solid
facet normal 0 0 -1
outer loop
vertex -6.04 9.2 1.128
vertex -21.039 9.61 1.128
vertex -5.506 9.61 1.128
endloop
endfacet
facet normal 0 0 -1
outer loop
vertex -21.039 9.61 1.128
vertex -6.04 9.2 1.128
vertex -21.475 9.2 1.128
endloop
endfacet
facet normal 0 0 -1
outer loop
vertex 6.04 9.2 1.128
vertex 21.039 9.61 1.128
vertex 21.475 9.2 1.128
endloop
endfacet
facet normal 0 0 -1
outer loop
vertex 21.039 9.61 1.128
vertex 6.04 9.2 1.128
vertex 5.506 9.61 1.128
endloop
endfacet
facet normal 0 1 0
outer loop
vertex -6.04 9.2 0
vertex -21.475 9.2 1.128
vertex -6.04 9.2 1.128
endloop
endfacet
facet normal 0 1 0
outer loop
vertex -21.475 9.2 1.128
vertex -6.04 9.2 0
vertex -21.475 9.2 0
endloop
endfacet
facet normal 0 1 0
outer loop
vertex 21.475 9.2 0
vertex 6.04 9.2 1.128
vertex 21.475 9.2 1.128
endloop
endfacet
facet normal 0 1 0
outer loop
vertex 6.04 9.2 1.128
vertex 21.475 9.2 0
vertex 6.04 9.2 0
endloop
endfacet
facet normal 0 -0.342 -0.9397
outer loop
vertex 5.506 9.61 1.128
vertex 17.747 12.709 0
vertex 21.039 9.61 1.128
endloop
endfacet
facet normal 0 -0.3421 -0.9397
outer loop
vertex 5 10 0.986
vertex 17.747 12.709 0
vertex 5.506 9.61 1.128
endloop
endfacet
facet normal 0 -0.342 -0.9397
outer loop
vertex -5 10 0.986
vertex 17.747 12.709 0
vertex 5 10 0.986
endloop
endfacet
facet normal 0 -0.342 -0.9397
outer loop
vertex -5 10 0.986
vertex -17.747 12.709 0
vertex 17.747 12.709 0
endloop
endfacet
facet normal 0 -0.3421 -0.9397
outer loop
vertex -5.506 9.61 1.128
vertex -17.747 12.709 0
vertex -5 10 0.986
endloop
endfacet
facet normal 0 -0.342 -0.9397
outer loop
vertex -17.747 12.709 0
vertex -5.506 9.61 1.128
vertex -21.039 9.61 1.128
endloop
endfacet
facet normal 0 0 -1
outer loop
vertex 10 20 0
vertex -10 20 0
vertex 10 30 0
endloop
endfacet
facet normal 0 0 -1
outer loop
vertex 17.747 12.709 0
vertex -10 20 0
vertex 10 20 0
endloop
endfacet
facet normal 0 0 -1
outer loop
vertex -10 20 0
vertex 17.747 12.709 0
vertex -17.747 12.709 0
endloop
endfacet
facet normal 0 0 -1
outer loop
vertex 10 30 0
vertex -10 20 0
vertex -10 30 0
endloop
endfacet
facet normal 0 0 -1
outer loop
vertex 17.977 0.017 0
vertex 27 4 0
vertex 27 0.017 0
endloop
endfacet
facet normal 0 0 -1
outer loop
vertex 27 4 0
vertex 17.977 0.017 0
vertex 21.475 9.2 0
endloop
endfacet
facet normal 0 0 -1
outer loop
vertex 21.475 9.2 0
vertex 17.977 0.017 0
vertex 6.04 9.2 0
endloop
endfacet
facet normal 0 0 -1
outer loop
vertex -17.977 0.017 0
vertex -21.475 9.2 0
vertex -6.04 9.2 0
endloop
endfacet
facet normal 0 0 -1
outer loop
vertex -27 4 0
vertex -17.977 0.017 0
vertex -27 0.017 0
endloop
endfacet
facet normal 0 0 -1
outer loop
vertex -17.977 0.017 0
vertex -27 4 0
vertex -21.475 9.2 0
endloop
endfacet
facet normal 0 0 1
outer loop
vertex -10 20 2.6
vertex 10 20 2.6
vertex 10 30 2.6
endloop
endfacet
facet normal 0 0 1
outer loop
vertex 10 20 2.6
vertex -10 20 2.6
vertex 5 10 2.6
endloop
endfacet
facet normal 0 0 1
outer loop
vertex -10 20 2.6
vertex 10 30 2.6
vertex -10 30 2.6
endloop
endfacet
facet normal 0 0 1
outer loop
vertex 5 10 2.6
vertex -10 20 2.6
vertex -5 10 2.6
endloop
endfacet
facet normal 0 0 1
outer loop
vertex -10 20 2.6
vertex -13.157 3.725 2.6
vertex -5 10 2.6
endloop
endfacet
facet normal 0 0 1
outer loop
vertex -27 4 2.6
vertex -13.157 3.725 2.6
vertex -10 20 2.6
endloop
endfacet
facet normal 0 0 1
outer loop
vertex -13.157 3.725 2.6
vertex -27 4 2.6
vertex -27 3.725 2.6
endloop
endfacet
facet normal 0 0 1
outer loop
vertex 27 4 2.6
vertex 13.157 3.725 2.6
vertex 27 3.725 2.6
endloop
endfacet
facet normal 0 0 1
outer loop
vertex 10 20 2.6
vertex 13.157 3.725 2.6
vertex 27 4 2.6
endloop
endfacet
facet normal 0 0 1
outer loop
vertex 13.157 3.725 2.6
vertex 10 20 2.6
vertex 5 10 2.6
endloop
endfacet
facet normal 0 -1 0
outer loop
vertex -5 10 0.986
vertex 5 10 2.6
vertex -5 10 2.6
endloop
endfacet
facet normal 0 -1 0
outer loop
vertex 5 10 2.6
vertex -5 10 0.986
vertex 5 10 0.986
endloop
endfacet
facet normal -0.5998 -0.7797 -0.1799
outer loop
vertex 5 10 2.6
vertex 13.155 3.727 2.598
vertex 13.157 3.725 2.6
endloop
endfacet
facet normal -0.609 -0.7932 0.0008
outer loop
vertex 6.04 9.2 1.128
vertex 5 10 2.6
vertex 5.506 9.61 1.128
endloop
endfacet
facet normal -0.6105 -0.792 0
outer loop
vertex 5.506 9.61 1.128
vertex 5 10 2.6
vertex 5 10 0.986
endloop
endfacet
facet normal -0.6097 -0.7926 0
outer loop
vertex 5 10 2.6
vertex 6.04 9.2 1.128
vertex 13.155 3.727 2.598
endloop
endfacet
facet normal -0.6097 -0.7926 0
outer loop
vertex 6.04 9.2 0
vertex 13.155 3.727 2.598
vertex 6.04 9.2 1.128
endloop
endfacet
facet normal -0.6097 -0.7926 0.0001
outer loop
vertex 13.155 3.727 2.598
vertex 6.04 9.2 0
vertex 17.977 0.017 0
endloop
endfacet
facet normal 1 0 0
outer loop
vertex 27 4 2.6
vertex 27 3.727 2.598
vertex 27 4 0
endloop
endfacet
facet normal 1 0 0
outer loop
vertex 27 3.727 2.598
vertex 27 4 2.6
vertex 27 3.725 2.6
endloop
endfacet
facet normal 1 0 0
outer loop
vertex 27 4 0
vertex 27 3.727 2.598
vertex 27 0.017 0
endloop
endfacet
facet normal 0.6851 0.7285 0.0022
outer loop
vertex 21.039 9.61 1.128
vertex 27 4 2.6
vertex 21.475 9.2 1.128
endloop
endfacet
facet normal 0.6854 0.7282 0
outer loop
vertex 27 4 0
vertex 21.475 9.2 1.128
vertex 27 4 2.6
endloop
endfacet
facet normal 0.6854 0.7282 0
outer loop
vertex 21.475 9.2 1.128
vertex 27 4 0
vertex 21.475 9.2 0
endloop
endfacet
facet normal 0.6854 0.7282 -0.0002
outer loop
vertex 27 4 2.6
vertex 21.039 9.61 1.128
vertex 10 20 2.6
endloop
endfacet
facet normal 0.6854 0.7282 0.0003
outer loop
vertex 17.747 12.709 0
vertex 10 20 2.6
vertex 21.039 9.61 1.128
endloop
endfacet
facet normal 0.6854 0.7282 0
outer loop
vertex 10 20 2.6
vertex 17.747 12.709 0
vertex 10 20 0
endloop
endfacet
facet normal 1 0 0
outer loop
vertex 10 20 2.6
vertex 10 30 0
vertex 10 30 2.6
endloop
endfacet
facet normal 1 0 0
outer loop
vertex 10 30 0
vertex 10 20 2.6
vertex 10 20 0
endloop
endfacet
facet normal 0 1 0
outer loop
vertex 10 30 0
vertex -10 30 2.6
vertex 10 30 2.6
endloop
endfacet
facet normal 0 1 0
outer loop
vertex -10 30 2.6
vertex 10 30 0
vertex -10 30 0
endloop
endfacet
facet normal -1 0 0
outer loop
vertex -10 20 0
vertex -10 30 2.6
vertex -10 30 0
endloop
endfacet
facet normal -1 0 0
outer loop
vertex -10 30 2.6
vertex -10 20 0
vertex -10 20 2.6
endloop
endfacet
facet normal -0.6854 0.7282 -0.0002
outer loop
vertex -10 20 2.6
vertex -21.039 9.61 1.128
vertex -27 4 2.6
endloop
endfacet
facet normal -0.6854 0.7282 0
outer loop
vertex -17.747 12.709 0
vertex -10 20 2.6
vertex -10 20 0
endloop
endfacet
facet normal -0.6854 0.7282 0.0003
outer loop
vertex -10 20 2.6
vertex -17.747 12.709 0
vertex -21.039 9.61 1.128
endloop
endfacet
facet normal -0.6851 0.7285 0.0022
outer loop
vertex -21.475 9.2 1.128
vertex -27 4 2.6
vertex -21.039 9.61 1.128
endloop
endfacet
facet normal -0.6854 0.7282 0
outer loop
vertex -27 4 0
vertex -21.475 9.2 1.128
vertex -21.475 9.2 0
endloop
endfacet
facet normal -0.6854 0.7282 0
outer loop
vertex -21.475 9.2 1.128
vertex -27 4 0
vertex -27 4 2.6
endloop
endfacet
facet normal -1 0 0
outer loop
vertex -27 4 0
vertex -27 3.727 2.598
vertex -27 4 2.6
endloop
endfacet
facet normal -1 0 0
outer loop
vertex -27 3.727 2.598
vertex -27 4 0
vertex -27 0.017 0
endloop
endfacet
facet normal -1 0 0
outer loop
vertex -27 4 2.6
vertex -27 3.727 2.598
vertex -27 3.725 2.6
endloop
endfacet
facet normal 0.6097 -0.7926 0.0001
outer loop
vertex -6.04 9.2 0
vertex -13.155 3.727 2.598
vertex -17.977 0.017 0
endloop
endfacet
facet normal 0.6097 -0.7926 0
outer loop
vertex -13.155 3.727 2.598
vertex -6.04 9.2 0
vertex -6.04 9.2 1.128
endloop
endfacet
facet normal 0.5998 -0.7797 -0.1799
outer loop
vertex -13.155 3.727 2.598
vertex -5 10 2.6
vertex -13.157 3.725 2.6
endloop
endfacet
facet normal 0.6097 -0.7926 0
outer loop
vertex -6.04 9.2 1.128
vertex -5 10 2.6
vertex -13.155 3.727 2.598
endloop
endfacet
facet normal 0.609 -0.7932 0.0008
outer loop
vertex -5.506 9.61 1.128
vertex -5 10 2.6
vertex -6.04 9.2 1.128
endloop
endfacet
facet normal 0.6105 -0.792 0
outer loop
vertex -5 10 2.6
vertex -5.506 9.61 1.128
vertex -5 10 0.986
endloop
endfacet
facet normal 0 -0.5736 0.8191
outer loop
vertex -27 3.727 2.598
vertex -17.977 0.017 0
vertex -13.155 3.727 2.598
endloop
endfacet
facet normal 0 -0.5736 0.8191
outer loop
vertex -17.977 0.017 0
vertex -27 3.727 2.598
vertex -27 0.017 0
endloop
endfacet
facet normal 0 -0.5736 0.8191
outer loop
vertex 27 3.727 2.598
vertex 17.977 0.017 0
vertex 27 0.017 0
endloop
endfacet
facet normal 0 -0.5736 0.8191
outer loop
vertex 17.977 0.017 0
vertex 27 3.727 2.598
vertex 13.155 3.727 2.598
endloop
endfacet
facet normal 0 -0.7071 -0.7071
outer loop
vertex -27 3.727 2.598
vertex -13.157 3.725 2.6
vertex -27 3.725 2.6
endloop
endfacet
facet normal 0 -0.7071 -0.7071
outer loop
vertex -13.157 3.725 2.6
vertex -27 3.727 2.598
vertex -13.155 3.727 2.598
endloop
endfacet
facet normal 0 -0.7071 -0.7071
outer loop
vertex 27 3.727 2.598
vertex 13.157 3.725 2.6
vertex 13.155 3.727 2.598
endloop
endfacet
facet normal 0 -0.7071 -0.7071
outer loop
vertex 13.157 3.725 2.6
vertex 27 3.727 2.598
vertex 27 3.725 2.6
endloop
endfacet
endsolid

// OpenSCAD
// reader-tools.scad
//
// Define tools to assist with assembly and operation of Monotype tape reader
//

include <reader-defs.scad> ;

use <reader-common.scad> ;

////////////////////////////////////////////////////////////////////////////////
// Definitions
////////////////////////////////////////////////////////////////////////////////

spool_removal_tool_l    = outer_d/2 + spool_sleeve_d ;
spool_removal_tool_w    = 10 ;
spool_removal_tool_t    = 6 ;
thumb_d                 = 25 ;

roller_gripping_tool_l  = 50 ;
roller_gripping_tool_w  = 8 ;
roller_gripping_tool_t  = 8 ;
roller_gripping_tool_d  = 14 ;

sprocket_gripping_tool_l  = 50 ;
sprocket_gripping_tool_w  = 8 ;
sprocket_gripping_tool_t  = 8 ;
sprocket_gripping_tool_d  = 20.5 ;

gripping_tool_ring_t    = 5 ;


////////////////////////////////////////////////////////////////////////////////
// Spool removal tool
////////////////////////////////////////////////////////////////////////////////

// Provides something to push against when extracting spool from winder side slot
//
// tool_l   length of tool handle from spool centre
// tool_w   width of tool handle
// tool_t   thickness of tool
// side_r   radius of spool holder side against which the tool presses
// side_t   thickness of guide that locates against spool holder side
// side_l   length of guide that locates against spool holder side
// slot_w   width of slot that locating tongue engages with
//
module spool_removal_tool(tool_l, tool_w, tool_t, side_r, side_t, side_l, slot_w) {
    difference() {
        // Blank body
        union() {
            translate([0,-tool_w/2,0])
                cube(size=[tool_l+thumb_d/2, tool_w, tool_t]) ;
            translate([tool_l+thumb_d/2,0,0])
                cylinder(d=thumb_d+4, h=tool_t) ;
        }
        // Cut away radius at end
        translate([0,0,-delta])
            cylinder(r=side_r-side_l, h=tool_t+2*delta) ;
        // Cut away so tool fits into slot
        translate([0,0,side_t])
            difference() {
                cylinder(r=side_r, h=tool_t+delta) ;
                translate([0,-(slot_w-clearance)/2,-delta])
                    cube(size=[side_r, slot_w-clearance, tool_t+3*delta]) ;
            }
        // Cut away thumb hole
        translate([tool_l+thumb_d/2,0,-delta])
            cylinder(d=thumb_d, h=tool_t+2*delta) ;
    }
}

////-spool_removal_tool()
// spool_removal_tool(
//     spool_removal_tool_l, spool_removal_tool_w, spool_removal_tool_t, 
//     winder_apex_d/2, 1.6, 2, spool_sleeve_d
//     ) ;


////////////////////////////////////////////////////////////////////////////////
// Roller gripping tool
////////////////////////////////////////////////////////////////////////////////

// Used to hold roller when assembling and adjusting end-float screws
//
// l        length of handle from roller centre
// w        width of handle
// t        thickness of handle
// d        diameter of roller

module roller_gripping_tool(l, w, t, d) {
    ring_t = gripping_tool_ring_t ;
    ring_d = d + ring_t*2 ;
    gap_d  = d-0.5 ;
    difference() {
        // Tool body blank
        union() {
            translate([-1,0,0])
                cylinder(d=ring_d, h=t) ;
            translate([d/2,-w/2,0])
                cube(size=[l,w,t]) ;
            translate([-ring_d/2,-w/2,0])
                cube(size=[ring_d,w/2,t]) ;
        }
        // Cut away for roller body
        translate([0,0,-delta]) {
            cylinder(d=d, h=t+2*delta) ;
        }
        // Cut away end 
        translate([-ring_d-5,-ring_d*0.5,-delta]) {
         cube(size=[ring_d,ring_d,t+2*delta]) ;
        }
        // Cut away opening to slip over roller
        translate([-d,-gap_d*0.5,-delta]) {
            cube(size=[d,gap_d,t+2*delta]) ;
        }
        translate([0,-d/2+1,t/2]) {
         rotate([0,0,-90])
             hex_screw_recess_X(m3, ring_t+2, m3_nut_af, m3_nut_t+1) ;
        }
    }
}

////-roller_gripping_tool()
// translate([0,thumb_d/2+roller_gripping_tool_d,0])
//     roller_gripping_tool(
//         roller_gripping_tool_l, roller_gripping_tool_w, roller_gripping_tool_t, 
//         roller_gripping_tool_d
//         ) ;


////////////////////////////////////////////////////////////////////////////////
// Sprocket gripping tool
////////////////////////////////////////////////////////////////////////////////

////-sprocket_gripping_tool()
// translate([0,thumb_d/2+roller_gripping_tool_d+sprocket_gripping_tool_d+gripping_tool_ring_t*3,0])
//     roller_gripping_tool(
//         sprocket_gripping_tool_l, sprocket_gripping_tool_w, sprocket_gripping_tool_t, 
//         sprocket_gripping_tool_d
//         ) ;


////////////////////////////////////////////////////////////////////////////////
// Nut spinner tool
////////////////////////////////////////////////////////////////////////////////

//  Used to tighten camera mounting nuts
//
//  l   = overall length
//  od  = overall diameter
//  sd  = shaft diameter
//  af  = nut AF size
//  nt  = nut thickness (depth of hex recess)
//
module nut_spinner_tool(l, od, sd, af, nt) {
    difference() {
        union() {
            cylinder(d=od, h=l, $nt=6) ;
            // Tabs for bed adhesion
            for (a=[0,120,240])
                rotate([0,0,a])
                    translate([0,-sd/2,0])
                        cube(size=[sd*2.5,sd,0.4]) ;
        }
        translate([0,0,l+delta])
            mirror([0,0,1])
                hex_screw_recess_Z(sd*1.5, l+2*delta, af, nt) ;
    }
}

module nut_spinner_tool_m4(l) {
    nut_spinner_tool(l, m4*2.25, m4, m4_nut_af+clearance*2, m4_nut_t*1.6) ;
}

module nut_spinner_tool_m3(l) {
    nut_spinner_tool(l, m3*2.25, m3, m3_nut_af+clearance*2, m3_nut_t*1.6) ;
}

////-nut_spinner_tool_m4(l)
// translate([-10,0,0])
//     nut_spinner_tool_m3(35) ;
// translate([+10,0,0])
//     nut_spinner_tool_m4(40) ;


////////////////////////////////////////////////////////////////////////////////
// Washer positioning tool
////////////////////////////////////////////////////////////////////////////////

// When assembling the reader rollers,  it is sometimes tricky supporting washers
// in-place while threading shaft screws into the assembly.  This tool is an attempt to help with this.
//
//
// l    = overall length
// od   = overall diameter of head
// wd   = diameter of washer
// sd   = diameter of shaft
// wt   = thickness of washer supports (e.g., for up to 3 washers)
// st   = thickness of supporting shim
//
module washer_positioning_tool(l, od, wd, sd, wt, st) {
    lt = 0.4 ;  // Thickness of retaining lip
    difference() {
        union() {
            cylinder(d=od, h=wt+st+lt) ;
            translate([-sd/2,0,0])
                cube(size=[sd,l,wt+st+lt]) ;
        }
    // Shaft cutout
    translate([0,0,-delta])
        // oval(x, d, h)
        oval(od, sd, wt+st+2*delta) ;
    // Washer support cutout
    translate([0,0,st]) {
        cylinder(d=wd, h=wt, $fn=16) ;
        oval(od, wd-lt, wt) ;
    }
    // Washer support lip cutout
    translate([0,0,st+wt-delta])
        oval(od, wd-lt, lt+delta*2) ;
    }
}

////-washer_positioning_tool(l, od, wd, sd, wt, st)
////-washer_positioning_tool_m4()
// washer_positioning_tool(40, m4_washer_d+1.6, m4_washer_d, m4, m4_washer_t*3, 0.8) ;



////////////////////////////////////////////////////////////////////////////////
// Tape clip retaining tab lift tool
////////////////////////////////////////////////////////////////////////////////

module tape_spool_clip_tab_lifter() {
    lifter_l  = 10 ;    // Length at apex of yoke
    lifter_l2 = 4 ;     // Length at edge
    lifter_l3 = 9.2 ;   // Length to retaining ridge
    handle_l2 = 20 ;    // length to handle
    handle_l  = 30 ;    // length incl handle
    lifter_w  = 54 ;
    lifter_w2 = 36 ;
    lifter_w3 = 10 ;
    handle_w  = 20 ;
    lifter_t  = 2.6 ;
    bevel_a   = 35 ;
    difference() {
        union() {
            linear_extrude(height=lifter_t)
                polygon(
                    points=[
                        [-lifter_w3/2, lifter_l],   // Inner U apex L
                        [-lifter_w2/2, 0],
                        [-lifter_w/2, 0],           // Bottom L corner
                        [-lifter_w/2, lifter_l2],
                        [-handle_w/2, handle_l2],
                        [-handle_w/2, handle_l],    // Top L corner
                        [+handle_w/2, handle_l],    // Top R corner
                        [+handle_w/2, handle_l2],
                        [+lifter_w/2, lifter_l2],
                        [+lifter_w/2, 0],           // Bottom R corner
                        [+lifter_w2/2, 0],
                        [+lifter_w3/2, lifter_l],   // Inner U apex L
                        ],
                    paths=[[0,1,2,3,4,5,6,7,8,9,10,11,0]]
                    ) ;
        }
        rotate([bevel_a,0,0])
            translate([-lifter_w/2-delta,0,-delta])
                cube(size=[lifter_w+2*delta,lifter_t/sin(bevel_a)+delta,lifter_t+delta]) ;
        //translate([0,lifter_l3,-0.2])
        //    rotate([-30,0,0])
        //        %cube(size=[lifter_w, 2, 1], center=true) ;
        translate([-lifter_w/2,lifter_l3,0]) {
            rotate([0,0,0])
                cube(size=[lifter_w, 1.2*sin(20), 1.2*cos(20)]) ;
            rotate([-20,0,0])
                cube(size=[lifter_w, 4, 1.2]) ;
        }
    }
}

////-tape_spool_clip_tab_lifter()
tape_spool_clip_tab_lifter() ;


////////////////////////////////////////////////////////////////////////////////
// xxxx
////////////////////////////////////////////////////////////////////////////////


//----
// module part_template(xxx) {
//     difference() {
//         union() {
//             xxx
//         }
//     xxx
//     }
// }
//----
